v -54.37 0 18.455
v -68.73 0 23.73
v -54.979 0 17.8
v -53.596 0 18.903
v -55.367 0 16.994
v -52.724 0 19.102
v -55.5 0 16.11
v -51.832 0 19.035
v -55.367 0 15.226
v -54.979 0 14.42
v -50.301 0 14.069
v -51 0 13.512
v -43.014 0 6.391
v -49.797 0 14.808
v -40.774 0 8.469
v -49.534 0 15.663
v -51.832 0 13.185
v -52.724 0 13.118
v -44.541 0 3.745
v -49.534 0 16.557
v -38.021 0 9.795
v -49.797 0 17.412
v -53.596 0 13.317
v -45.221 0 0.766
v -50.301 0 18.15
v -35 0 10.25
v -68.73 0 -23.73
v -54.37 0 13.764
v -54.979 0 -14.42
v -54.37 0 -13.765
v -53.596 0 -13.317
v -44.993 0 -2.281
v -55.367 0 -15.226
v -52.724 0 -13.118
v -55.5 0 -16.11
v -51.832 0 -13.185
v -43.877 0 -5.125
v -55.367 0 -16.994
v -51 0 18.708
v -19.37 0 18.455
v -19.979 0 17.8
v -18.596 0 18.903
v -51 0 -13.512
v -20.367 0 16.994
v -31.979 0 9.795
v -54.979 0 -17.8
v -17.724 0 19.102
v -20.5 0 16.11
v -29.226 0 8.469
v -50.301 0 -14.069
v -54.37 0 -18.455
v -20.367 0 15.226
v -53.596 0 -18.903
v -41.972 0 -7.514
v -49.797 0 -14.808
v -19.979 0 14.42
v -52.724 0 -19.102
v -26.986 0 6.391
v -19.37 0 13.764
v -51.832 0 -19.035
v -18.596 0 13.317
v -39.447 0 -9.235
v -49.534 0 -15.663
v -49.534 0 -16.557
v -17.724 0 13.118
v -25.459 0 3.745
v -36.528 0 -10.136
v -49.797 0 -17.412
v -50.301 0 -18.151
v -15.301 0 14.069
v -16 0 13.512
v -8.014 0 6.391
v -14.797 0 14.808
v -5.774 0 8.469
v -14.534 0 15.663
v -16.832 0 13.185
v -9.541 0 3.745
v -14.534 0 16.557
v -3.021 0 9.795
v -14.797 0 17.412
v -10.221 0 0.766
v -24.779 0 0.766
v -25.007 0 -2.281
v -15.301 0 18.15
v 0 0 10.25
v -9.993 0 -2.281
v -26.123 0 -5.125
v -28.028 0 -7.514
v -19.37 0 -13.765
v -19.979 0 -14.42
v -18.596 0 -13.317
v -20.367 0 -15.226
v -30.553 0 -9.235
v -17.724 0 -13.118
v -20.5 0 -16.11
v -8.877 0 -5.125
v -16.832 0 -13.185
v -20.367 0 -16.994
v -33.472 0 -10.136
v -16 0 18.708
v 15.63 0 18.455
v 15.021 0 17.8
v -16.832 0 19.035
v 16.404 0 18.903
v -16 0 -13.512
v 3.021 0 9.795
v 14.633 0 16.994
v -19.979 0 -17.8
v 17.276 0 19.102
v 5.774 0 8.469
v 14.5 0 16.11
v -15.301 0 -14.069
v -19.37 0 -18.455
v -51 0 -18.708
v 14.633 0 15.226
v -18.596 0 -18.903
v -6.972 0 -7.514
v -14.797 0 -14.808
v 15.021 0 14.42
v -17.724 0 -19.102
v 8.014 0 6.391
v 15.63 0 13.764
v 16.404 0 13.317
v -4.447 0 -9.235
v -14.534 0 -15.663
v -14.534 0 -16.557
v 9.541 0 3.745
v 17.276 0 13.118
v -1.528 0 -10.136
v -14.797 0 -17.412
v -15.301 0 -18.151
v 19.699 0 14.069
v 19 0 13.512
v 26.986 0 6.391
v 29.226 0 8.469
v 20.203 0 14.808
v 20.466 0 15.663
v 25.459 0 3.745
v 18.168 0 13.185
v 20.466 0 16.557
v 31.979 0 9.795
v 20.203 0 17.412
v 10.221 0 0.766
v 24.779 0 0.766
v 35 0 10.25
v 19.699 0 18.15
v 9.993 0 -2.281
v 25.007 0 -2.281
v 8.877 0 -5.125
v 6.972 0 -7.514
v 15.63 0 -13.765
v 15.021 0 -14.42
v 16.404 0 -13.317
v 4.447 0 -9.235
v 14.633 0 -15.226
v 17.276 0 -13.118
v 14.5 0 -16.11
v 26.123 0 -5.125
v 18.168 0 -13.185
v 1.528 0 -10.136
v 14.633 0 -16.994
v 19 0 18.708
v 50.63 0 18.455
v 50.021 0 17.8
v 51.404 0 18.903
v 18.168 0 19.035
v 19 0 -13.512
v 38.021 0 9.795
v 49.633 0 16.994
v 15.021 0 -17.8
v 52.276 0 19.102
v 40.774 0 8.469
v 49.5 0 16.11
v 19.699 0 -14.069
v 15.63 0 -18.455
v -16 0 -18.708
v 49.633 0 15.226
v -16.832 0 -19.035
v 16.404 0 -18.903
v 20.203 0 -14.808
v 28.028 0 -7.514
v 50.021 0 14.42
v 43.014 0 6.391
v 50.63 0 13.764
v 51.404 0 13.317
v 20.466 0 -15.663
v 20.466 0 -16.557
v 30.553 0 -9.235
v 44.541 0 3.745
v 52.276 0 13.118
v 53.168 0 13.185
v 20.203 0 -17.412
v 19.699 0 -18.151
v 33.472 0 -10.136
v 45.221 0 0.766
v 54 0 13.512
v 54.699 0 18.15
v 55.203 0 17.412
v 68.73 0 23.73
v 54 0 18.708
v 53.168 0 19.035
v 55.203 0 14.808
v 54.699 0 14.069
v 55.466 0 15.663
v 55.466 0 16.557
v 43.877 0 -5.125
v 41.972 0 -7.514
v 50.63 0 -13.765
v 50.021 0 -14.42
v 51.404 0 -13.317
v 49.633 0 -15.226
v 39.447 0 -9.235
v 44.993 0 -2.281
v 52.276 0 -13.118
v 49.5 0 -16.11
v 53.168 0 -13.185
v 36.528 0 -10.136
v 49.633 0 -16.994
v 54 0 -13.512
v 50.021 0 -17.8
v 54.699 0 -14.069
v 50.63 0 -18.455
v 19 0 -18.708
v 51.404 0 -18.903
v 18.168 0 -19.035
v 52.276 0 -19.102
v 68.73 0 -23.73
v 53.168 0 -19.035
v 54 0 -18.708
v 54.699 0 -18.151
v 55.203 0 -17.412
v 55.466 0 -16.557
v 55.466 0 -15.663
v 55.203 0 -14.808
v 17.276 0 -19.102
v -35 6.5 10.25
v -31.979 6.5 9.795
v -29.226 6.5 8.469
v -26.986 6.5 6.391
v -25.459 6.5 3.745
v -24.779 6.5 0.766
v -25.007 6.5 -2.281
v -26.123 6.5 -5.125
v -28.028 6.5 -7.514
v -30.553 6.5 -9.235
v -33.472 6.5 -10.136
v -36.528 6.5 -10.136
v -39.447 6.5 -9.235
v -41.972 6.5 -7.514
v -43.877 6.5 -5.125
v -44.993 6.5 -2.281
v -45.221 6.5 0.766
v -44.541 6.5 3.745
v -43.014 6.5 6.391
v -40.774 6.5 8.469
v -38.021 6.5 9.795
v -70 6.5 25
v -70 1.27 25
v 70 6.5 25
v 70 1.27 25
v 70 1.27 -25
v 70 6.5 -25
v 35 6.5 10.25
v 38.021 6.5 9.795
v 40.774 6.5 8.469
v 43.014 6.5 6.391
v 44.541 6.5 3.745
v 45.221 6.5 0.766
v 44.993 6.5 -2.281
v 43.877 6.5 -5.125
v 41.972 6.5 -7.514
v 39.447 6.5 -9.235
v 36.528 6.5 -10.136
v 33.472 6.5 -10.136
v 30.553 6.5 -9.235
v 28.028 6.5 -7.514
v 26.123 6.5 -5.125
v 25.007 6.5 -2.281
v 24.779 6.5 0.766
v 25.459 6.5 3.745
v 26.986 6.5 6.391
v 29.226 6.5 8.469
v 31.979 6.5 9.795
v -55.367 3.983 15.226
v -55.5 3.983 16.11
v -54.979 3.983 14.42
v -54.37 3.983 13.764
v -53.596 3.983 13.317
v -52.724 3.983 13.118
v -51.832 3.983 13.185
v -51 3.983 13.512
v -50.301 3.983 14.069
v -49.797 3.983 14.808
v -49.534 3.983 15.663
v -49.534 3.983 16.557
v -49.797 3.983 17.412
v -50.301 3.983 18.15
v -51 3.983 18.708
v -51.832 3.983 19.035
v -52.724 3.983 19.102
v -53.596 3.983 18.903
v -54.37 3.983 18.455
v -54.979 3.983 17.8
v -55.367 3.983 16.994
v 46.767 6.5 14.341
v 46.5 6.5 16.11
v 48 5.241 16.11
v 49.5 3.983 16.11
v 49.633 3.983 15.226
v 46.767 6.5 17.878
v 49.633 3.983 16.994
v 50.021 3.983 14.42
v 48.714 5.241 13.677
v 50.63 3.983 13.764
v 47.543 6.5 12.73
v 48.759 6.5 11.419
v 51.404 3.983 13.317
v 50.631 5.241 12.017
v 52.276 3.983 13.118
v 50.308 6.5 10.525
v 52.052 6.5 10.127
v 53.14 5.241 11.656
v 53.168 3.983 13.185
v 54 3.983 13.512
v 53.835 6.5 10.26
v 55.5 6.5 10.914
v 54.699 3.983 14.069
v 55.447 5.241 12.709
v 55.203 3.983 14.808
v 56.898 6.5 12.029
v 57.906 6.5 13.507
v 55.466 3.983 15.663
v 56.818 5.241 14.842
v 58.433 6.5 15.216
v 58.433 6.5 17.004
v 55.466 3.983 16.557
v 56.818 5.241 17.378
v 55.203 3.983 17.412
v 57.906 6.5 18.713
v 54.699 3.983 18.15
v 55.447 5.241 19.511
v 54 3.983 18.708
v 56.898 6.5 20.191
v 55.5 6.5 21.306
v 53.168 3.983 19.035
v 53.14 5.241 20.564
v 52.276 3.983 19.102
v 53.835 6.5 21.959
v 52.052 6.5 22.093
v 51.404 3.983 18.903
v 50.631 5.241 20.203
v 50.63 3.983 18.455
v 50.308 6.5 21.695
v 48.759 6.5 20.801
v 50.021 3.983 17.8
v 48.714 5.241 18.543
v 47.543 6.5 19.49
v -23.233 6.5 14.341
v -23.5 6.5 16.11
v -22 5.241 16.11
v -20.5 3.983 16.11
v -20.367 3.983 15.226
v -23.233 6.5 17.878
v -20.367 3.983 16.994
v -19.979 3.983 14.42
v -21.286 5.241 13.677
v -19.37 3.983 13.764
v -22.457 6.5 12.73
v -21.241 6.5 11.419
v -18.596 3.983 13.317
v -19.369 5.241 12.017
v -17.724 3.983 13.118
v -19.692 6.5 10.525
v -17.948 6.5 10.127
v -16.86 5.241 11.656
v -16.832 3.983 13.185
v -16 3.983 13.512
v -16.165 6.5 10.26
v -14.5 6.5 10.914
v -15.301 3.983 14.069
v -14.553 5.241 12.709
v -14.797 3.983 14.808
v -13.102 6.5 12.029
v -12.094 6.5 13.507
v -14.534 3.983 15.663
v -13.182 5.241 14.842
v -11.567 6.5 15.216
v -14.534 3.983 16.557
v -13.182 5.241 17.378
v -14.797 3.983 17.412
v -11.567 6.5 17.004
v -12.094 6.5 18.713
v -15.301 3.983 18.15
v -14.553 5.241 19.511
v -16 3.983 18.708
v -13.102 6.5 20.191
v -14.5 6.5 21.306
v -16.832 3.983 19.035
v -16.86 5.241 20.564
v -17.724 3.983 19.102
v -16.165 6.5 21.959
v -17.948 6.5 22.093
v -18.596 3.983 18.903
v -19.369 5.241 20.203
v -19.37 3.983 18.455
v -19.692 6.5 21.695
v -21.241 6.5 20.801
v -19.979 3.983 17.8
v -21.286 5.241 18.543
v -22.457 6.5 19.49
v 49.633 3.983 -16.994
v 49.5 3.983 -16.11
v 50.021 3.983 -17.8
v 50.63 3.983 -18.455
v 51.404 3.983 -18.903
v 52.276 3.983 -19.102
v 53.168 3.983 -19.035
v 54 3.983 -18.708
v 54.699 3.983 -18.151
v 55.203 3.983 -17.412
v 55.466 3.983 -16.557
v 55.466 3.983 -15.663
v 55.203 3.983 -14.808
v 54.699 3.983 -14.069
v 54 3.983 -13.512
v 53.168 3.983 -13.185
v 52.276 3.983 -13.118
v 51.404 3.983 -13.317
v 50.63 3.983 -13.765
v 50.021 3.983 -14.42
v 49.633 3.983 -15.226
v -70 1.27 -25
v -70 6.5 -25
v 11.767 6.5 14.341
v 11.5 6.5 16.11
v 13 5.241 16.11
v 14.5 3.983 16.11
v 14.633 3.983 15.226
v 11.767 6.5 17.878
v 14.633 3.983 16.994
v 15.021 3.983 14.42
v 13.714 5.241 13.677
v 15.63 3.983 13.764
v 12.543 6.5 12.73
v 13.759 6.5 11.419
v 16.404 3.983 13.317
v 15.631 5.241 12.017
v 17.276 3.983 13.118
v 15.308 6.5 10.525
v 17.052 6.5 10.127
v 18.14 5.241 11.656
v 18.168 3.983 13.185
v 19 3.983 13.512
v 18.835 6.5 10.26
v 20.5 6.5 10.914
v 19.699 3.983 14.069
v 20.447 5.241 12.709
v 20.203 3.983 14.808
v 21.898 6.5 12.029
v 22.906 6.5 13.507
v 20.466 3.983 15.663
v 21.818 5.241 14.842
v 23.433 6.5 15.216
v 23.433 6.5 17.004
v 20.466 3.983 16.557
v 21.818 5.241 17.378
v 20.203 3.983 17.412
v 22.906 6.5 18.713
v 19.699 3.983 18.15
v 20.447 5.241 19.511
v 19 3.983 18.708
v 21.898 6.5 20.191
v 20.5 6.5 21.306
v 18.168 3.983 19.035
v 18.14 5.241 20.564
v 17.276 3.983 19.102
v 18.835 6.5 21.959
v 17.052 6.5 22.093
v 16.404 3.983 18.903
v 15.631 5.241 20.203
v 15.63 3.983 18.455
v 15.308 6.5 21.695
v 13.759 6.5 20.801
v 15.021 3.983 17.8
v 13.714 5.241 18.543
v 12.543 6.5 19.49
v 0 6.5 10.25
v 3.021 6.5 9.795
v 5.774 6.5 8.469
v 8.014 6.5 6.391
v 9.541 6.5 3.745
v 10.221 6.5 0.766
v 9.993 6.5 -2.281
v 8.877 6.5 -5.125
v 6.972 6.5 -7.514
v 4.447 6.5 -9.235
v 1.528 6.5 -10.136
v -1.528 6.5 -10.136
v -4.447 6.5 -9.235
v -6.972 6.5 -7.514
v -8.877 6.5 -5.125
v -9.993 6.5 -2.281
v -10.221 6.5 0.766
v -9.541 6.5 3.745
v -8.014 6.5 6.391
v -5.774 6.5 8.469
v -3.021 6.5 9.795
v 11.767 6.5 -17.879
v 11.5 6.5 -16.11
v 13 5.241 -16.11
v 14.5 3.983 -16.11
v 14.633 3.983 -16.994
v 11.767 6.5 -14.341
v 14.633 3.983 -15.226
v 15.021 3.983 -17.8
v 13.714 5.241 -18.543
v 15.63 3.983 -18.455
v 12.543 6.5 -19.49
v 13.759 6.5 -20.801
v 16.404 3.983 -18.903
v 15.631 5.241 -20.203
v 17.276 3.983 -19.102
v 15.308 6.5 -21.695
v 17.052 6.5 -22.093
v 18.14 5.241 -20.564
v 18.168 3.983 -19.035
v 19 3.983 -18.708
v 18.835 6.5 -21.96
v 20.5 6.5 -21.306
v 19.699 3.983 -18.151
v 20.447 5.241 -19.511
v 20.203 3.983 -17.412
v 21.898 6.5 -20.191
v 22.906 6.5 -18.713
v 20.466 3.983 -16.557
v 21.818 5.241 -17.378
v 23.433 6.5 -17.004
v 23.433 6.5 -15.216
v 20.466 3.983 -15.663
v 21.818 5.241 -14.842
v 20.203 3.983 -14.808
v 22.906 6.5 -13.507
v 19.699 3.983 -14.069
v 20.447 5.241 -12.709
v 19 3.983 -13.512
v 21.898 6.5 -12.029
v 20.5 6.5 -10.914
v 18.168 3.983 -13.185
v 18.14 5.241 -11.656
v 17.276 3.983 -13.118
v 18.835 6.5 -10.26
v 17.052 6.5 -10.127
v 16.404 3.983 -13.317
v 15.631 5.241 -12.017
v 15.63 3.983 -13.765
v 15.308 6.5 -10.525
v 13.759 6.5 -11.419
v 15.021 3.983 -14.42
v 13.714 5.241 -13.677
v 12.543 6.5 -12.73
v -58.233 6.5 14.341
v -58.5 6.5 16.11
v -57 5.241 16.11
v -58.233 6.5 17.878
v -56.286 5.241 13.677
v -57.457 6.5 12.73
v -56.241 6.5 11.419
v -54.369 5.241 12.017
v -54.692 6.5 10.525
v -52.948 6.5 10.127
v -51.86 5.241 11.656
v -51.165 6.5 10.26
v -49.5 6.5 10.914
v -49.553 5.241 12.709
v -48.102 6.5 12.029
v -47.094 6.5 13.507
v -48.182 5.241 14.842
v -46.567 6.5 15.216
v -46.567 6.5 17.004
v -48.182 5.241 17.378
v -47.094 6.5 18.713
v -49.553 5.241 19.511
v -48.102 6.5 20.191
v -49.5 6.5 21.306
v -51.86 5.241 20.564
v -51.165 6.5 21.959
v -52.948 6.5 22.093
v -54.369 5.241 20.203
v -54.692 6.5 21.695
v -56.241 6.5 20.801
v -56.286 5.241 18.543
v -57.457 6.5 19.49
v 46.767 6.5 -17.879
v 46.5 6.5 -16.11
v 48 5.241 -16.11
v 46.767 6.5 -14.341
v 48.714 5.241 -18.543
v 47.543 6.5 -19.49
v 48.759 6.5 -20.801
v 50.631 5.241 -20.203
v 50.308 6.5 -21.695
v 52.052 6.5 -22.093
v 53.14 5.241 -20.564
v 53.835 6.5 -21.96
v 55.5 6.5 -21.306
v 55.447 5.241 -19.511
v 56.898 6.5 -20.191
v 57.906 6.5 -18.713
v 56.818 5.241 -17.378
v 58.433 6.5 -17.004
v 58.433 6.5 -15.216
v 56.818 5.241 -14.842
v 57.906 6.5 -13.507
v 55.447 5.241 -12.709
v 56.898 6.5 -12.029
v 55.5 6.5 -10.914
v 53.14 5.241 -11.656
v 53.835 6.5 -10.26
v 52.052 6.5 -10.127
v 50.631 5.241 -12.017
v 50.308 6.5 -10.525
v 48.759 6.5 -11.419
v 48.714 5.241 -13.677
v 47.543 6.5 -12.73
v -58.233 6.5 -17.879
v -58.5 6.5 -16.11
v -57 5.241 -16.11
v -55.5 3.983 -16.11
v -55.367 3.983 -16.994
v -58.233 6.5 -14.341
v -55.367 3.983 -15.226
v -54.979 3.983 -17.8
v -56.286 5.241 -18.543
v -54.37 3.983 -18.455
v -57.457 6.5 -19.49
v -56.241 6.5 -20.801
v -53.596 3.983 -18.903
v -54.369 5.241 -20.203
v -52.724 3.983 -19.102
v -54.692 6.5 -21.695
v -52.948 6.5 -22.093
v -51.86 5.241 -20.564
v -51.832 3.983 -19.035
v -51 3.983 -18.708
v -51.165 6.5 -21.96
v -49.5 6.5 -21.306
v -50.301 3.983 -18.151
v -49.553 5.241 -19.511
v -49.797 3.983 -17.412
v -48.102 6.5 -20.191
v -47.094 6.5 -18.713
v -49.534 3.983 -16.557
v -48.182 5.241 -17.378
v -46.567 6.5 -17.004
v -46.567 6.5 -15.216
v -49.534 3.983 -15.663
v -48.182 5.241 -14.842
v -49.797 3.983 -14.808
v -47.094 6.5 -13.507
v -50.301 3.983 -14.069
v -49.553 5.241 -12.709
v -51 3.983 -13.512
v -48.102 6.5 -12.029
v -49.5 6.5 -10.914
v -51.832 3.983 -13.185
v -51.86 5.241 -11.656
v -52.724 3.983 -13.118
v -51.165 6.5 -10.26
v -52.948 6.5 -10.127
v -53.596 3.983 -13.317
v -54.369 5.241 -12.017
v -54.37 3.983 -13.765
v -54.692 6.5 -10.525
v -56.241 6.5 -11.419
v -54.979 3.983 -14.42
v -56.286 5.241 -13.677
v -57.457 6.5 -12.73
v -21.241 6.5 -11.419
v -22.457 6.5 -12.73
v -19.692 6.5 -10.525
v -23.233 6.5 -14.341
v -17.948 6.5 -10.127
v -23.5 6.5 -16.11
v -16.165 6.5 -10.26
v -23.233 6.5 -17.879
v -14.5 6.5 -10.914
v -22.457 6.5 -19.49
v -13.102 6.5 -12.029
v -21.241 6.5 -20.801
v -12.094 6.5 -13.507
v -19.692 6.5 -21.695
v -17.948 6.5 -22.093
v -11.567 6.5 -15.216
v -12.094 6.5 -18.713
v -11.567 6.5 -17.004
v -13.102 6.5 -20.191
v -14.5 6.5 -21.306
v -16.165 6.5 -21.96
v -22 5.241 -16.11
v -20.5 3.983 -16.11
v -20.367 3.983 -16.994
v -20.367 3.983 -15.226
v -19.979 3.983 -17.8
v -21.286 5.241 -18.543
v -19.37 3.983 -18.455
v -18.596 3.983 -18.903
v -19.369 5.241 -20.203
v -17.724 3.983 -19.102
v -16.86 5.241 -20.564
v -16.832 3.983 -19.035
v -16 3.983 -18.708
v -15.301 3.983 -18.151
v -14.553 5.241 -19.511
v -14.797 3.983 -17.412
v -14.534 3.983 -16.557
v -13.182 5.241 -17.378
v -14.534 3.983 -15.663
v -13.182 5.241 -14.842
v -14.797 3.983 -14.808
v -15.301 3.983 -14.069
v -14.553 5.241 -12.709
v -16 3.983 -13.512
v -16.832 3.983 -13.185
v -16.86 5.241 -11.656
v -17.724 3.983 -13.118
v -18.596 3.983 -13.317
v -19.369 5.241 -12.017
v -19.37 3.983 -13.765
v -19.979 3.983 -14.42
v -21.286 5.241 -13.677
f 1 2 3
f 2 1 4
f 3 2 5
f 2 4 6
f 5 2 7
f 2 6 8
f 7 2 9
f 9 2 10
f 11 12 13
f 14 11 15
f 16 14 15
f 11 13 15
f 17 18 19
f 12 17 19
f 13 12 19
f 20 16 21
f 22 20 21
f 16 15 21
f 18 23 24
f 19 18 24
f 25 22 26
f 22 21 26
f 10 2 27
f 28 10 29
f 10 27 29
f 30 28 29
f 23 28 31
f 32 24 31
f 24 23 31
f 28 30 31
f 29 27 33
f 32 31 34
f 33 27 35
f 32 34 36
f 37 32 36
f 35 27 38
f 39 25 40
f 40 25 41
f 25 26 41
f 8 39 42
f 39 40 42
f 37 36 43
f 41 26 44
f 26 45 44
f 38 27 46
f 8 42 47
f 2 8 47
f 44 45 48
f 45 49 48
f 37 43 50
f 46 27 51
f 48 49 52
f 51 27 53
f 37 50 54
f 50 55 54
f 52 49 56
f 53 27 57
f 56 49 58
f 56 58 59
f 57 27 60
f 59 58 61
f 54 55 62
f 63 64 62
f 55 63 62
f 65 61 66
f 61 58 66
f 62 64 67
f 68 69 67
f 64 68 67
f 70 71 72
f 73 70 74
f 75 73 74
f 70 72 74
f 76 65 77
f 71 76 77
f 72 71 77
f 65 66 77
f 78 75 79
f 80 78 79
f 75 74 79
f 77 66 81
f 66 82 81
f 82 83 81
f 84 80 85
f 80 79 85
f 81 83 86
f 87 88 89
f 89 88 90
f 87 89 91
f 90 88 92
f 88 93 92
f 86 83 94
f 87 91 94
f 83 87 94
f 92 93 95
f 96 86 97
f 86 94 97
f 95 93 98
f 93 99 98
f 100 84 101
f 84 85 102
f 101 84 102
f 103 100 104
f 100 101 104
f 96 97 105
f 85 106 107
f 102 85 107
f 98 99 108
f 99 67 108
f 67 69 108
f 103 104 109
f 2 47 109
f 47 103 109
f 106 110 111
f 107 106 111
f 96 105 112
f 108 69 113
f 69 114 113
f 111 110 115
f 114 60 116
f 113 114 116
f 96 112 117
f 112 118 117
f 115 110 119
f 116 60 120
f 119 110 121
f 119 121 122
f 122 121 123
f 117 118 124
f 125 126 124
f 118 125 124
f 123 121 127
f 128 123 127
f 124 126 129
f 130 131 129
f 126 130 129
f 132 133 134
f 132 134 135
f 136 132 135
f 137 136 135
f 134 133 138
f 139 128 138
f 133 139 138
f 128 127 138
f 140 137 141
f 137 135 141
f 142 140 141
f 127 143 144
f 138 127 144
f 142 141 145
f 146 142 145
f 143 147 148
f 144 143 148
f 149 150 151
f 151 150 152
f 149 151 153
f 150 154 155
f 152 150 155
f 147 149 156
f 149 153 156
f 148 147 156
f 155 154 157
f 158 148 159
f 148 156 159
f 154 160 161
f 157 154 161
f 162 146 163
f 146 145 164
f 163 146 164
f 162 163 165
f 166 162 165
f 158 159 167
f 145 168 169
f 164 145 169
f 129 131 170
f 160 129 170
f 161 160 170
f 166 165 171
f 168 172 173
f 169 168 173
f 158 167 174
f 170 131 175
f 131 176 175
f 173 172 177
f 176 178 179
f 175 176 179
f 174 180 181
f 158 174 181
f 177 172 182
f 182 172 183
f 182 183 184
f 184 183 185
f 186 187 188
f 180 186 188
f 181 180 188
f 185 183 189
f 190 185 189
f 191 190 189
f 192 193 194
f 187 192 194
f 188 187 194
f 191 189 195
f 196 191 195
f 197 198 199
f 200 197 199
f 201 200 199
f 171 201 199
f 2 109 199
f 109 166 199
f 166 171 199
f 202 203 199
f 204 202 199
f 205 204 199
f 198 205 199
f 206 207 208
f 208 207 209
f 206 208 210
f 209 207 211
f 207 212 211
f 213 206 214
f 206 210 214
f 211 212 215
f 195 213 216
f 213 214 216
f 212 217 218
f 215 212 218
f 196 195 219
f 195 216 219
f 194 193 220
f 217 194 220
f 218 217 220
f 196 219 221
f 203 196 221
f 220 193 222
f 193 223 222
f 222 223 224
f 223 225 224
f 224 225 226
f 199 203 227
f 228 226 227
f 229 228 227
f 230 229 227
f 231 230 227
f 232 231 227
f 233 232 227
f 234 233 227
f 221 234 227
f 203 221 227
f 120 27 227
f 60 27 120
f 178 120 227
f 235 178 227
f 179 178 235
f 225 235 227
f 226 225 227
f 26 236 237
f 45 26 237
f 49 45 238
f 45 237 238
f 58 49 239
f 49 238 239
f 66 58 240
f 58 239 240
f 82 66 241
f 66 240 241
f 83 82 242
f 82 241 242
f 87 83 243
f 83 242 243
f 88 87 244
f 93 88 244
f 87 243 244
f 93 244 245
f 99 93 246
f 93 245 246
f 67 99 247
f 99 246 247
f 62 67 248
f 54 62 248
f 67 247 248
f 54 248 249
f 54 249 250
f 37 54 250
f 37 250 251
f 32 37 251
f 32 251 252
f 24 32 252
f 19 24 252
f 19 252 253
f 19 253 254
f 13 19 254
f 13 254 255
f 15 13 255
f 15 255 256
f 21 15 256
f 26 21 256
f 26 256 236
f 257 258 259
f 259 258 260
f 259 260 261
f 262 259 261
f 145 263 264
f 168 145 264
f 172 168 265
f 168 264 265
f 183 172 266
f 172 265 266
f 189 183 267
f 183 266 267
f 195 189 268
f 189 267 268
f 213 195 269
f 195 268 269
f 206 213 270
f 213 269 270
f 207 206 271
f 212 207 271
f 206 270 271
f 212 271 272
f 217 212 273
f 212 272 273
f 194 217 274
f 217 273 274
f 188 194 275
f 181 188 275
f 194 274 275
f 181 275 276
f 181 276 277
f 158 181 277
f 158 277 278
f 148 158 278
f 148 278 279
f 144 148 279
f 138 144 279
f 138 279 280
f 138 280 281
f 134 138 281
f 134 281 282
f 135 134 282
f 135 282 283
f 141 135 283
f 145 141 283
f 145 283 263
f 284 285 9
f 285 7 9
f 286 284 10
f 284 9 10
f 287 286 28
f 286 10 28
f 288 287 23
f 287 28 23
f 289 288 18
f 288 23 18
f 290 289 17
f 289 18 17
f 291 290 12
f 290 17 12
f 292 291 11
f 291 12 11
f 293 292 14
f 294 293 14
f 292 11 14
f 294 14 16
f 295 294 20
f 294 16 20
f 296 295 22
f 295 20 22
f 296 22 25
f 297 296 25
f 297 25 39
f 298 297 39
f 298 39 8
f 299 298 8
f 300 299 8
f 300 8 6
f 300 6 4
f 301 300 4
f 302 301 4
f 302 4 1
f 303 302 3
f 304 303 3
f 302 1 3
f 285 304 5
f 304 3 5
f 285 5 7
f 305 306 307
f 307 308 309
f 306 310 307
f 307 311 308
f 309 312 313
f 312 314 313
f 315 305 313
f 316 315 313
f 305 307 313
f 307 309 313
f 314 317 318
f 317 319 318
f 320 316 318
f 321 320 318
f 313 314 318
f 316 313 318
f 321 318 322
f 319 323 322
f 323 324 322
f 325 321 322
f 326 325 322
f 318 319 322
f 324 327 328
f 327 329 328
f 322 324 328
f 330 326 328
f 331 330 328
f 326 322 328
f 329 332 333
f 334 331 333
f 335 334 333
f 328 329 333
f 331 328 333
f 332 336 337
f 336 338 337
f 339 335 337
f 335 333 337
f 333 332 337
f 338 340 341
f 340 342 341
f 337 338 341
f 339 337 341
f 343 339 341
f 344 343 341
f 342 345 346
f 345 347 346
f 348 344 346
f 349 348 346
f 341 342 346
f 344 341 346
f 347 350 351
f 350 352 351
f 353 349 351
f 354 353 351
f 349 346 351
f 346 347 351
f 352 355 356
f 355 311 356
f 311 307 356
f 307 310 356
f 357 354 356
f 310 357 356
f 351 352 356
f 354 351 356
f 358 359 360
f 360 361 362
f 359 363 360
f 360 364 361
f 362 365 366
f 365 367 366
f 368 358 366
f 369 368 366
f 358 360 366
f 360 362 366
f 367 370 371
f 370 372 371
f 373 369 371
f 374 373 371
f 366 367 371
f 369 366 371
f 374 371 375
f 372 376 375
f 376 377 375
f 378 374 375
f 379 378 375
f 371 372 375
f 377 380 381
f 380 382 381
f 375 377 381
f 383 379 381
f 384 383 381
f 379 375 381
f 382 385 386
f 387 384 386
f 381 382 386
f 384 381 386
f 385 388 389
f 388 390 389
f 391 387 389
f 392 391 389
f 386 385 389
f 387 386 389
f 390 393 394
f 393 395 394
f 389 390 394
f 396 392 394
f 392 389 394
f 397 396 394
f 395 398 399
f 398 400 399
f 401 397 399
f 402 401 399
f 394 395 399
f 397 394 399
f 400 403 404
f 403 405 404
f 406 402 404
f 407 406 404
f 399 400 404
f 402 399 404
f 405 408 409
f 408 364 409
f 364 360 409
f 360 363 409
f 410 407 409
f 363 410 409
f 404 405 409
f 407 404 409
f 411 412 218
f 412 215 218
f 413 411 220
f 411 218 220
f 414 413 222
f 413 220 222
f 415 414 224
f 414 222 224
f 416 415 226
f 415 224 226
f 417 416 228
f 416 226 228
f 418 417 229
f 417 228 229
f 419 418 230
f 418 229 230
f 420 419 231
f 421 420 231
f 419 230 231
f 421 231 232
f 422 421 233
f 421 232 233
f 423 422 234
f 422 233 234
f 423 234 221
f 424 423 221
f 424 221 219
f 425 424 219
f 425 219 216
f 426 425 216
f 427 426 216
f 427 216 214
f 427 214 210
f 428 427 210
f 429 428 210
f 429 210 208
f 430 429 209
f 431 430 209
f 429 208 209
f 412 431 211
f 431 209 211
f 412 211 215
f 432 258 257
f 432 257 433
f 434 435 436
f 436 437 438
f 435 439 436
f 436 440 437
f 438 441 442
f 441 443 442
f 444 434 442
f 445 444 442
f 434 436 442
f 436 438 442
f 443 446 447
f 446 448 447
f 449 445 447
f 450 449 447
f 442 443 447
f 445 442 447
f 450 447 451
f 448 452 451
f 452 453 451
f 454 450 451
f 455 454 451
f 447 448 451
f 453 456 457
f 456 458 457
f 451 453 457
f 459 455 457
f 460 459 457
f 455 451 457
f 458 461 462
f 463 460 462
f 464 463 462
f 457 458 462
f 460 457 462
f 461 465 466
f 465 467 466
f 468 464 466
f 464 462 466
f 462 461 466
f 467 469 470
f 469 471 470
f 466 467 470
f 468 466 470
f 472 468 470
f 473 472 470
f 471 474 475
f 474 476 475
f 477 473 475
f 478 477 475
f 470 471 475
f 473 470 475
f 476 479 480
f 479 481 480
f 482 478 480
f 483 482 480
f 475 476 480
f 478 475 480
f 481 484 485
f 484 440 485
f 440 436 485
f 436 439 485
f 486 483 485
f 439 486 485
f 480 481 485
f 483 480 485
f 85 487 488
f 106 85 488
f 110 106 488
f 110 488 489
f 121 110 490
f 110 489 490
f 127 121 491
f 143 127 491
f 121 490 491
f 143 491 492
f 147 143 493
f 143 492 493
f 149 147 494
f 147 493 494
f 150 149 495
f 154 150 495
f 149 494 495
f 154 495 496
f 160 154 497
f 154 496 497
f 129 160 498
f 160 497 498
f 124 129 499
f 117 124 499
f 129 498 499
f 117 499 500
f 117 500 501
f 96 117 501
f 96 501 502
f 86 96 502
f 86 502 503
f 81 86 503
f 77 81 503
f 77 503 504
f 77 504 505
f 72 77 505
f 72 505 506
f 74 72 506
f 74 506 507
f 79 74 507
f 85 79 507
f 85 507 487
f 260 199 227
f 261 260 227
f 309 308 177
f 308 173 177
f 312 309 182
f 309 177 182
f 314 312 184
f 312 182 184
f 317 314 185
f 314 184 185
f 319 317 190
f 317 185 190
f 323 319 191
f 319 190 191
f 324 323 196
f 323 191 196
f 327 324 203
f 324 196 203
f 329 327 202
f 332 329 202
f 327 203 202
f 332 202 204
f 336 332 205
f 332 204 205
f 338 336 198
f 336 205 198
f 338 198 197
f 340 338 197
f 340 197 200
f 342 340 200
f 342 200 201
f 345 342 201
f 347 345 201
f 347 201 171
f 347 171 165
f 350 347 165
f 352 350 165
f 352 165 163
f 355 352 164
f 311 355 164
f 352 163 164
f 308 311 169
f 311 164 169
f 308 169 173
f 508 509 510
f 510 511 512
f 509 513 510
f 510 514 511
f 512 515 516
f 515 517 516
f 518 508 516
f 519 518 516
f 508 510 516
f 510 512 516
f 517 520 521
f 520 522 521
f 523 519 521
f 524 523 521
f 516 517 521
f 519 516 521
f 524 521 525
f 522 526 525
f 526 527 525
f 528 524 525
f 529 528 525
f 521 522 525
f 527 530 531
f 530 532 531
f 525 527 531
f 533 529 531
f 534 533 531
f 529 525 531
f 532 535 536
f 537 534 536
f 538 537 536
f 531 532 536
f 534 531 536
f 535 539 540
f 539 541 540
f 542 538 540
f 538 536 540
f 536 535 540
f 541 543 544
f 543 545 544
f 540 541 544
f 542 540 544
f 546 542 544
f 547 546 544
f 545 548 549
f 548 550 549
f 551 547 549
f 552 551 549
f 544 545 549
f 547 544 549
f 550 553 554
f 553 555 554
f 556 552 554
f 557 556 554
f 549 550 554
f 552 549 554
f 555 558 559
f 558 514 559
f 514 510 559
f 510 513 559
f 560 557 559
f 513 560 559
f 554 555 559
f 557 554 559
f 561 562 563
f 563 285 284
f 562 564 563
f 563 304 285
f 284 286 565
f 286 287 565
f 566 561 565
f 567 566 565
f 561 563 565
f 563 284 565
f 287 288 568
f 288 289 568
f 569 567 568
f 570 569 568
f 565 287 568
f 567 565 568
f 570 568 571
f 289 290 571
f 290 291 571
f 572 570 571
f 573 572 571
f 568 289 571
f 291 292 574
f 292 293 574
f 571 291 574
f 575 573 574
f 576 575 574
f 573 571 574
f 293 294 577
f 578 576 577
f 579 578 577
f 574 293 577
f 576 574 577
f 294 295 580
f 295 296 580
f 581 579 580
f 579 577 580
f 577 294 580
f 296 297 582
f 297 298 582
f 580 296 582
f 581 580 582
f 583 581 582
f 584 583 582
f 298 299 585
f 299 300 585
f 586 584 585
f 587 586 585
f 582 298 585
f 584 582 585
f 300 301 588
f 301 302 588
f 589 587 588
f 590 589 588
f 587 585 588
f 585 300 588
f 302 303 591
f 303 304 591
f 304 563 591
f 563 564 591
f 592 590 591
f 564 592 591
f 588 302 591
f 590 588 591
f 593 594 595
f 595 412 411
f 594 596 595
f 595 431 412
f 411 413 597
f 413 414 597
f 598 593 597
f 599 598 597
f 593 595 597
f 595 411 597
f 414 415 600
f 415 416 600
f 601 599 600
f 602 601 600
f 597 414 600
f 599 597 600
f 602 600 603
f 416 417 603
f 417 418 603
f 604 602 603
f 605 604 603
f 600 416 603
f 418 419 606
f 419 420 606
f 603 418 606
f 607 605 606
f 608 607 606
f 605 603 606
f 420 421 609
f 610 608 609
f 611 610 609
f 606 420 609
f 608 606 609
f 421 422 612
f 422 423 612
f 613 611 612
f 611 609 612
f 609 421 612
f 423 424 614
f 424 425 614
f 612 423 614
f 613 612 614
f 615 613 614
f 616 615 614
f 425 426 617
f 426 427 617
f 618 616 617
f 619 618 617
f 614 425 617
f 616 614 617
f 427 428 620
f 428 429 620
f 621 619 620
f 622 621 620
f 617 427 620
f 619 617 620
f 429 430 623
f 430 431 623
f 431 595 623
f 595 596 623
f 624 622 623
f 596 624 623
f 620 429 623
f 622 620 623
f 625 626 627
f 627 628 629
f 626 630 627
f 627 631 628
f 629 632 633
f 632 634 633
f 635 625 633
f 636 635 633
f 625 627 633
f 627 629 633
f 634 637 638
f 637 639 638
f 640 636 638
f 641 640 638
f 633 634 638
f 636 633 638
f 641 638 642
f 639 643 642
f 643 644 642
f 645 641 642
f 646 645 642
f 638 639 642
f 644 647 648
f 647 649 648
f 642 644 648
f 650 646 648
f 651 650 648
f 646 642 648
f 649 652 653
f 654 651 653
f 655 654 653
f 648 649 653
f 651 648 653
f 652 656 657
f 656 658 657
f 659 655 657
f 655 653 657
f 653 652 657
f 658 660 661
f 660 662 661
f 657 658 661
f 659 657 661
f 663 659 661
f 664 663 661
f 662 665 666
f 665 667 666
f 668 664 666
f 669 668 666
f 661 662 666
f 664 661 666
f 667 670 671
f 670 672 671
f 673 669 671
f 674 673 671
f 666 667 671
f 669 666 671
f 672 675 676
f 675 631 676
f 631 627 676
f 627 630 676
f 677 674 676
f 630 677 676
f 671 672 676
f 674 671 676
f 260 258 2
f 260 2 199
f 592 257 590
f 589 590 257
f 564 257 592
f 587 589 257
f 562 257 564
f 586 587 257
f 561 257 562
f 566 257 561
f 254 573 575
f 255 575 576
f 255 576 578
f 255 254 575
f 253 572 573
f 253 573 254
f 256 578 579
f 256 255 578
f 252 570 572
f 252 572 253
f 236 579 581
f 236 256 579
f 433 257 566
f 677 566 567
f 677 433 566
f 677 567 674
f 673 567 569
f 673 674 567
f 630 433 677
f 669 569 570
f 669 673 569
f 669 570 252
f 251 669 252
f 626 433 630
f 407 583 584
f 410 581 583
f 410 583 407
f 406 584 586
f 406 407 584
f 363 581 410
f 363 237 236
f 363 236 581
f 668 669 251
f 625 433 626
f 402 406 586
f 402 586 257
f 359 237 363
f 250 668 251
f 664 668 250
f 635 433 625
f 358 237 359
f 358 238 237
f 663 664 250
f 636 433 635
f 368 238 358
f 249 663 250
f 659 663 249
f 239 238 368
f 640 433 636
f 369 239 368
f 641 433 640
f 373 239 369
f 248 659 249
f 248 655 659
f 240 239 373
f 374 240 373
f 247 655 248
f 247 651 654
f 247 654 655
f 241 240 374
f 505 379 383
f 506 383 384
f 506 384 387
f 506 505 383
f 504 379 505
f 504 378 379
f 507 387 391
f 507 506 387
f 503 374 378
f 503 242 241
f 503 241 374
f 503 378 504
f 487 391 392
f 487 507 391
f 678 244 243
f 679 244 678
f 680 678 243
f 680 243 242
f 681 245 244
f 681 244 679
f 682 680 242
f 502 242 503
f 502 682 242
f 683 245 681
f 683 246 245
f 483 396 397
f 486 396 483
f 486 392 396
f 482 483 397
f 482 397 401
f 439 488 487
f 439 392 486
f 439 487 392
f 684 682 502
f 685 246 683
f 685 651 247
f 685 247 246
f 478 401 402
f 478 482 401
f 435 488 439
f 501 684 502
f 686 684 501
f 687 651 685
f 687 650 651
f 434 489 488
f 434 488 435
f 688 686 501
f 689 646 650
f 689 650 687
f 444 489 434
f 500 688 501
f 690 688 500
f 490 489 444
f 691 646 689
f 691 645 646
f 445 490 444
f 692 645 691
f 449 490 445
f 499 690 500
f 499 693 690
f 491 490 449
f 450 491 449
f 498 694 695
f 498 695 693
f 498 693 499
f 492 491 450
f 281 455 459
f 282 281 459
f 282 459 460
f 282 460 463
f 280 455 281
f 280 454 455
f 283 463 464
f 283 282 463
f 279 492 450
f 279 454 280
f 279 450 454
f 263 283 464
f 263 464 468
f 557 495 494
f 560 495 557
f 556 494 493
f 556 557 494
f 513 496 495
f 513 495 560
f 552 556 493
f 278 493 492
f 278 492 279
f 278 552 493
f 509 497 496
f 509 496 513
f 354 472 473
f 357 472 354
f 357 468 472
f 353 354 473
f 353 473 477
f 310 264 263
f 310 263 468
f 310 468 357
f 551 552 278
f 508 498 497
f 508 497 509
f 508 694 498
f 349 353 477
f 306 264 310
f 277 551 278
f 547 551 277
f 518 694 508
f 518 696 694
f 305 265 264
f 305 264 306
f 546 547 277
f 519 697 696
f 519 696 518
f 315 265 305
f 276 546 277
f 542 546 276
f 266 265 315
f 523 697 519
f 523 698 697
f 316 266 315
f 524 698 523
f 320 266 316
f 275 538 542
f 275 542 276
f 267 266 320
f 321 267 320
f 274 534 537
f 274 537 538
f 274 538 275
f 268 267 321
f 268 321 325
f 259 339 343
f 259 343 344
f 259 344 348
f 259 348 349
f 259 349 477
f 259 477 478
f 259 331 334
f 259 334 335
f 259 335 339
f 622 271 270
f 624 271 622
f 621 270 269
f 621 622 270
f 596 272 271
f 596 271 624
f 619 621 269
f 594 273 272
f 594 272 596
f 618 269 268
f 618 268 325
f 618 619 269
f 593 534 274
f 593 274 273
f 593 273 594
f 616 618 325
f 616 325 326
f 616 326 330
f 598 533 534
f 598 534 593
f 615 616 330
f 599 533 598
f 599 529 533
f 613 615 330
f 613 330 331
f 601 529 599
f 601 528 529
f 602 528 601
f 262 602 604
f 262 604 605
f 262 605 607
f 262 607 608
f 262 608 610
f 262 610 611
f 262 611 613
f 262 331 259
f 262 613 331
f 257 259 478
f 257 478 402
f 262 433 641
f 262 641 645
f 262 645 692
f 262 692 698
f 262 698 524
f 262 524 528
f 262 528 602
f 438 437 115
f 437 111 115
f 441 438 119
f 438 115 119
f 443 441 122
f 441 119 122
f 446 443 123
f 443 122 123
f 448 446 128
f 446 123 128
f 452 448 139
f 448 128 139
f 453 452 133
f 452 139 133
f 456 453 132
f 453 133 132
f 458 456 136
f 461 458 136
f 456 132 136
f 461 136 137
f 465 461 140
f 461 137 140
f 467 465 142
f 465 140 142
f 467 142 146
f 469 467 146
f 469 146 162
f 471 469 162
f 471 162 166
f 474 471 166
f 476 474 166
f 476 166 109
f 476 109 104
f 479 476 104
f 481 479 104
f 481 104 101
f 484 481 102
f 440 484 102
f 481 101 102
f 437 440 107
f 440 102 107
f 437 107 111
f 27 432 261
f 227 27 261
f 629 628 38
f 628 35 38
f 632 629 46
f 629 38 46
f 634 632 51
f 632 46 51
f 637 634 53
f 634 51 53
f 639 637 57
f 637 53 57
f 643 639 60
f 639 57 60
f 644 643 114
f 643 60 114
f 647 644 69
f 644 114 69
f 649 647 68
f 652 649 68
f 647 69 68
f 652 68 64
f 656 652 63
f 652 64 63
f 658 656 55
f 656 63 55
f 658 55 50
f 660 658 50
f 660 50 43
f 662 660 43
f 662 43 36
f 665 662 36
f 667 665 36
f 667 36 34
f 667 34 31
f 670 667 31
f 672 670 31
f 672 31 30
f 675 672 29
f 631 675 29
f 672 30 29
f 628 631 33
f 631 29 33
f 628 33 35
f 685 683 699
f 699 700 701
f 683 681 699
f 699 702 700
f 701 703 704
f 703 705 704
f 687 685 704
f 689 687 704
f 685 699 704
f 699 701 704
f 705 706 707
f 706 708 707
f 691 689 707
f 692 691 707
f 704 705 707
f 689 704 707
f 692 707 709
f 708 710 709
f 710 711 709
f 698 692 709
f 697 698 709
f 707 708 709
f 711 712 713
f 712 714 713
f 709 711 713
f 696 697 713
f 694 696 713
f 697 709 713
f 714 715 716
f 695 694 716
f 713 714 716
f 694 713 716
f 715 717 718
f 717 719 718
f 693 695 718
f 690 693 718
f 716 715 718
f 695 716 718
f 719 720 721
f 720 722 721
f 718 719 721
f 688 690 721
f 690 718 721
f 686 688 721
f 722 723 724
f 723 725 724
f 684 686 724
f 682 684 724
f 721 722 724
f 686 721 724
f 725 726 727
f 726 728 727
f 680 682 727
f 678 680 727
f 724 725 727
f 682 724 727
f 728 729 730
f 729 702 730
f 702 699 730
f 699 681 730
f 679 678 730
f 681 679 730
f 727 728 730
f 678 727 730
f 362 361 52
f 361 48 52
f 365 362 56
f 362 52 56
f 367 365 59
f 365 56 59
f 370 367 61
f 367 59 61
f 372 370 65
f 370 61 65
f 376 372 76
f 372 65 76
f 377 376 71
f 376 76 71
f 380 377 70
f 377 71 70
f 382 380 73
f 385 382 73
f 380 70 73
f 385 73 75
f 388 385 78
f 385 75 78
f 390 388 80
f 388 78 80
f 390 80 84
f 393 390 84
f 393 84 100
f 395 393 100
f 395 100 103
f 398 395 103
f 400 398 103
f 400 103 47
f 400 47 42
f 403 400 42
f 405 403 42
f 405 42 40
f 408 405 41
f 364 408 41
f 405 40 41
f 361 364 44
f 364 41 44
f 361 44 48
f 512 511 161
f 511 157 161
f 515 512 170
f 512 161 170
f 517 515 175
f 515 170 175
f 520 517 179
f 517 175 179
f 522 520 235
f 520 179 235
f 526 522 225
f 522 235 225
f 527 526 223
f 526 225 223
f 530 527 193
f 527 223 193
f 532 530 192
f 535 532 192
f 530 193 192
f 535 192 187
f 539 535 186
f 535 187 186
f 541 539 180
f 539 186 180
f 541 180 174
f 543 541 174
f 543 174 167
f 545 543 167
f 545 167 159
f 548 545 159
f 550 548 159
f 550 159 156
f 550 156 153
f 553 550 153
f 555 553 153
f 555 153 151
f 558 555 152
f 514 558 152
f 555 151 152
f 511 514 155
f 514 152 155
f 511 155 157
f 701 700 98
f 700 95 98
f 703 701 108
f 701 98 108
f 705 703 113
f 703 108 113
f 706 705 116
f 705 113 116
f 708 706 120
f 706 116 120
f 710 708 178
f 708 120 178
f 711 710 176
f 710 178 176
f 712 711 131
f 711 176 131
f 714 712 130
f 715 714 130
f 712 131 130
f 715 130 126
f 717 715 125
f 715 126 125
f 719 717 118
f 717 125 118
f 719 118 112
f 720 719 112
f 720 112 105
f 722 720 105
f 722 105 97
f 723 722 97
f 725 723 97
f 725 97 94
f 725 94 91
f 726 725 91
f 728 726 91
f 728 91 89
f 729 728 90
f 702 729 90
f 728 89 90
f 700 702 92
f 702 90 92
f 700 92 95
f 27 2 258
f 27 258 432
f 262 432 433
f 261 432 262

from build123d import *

# Parameters (mm, degrees)
SKETCH1_W                                         = 140
SKETCH1_H                                         = 50
BOSS_EXTRUDE2_DEPTH                               = 6.5
SKETCH2_R                                         = 10.25
CUT_EXTRUDE1_DEPTH                                = 12.7
LPATTERN1_COUNT                                   = 2
LPATTERN1_PITCH                                   = 35
LPATTERN1_COL_COUNT                               = 2
LPATTERN1_COL_PITCH                               = 35
CSK_FOR_6_FLAT_HEAD_MACHINE_SCREW_100_D           = 6
CSK_FOR_6_FLAT_HEAD_MACHINE_SCREW_100_CSINK_D     = 12
CSK_FOR_6_FLAT_HEAD_MACHINE_SCREW_100_CSINK_ANGLE = 100
LPATTERN2_COUNT                                   = 4
LPATTERN2_PITCH                                   = 35
LPATTERN2_COUNT_DIR2                              = 2
LPATTERN2_PITCH_DIR2                              = 32.2199
CHAMFER1_SIZE                                     = 1.27


with BuildPart() as part:
    # Sketch1 → Boss-Extrude2 (new body)
    with BuildSketch(Plane(origin=(0, 0, 0), x_dir=(1, 0, 0), z_dir=(0, 1, 0))):
        Rectangle(SKETCH1_W, SKETCH1_H)
    extrude(amount=BOSS_EXTRUDE2_DEPTH)

    # Sketch2 → Cut-Extrude1 (cut)
    with BuildSketch(Plane(origin=(0, 6.5, 0), x_dir=(1, 0, 0), z_dir=(0, 1, 0))):
        with Locations(Location((0, 0, 0), (0, 0, 270))):
            Circle(SKETCH2_R)
    cut_extrude1 = extrude(amount=-CUT_EXTRUDE1_DEPTH, mode=Mode.SUBTRACT)

    # LPattern1: Cut-Extrude1 ×2
    with Locations(*[(i * LPATTERN1_PITCH, 0, 0) for i in range(1, LPATTERN1_COUNT)]):
        add(cut_extrude1, mode=Mode.SUBTRACT)

    # LPattern1 col: Cut-Extrude1 ×2
    with Locations(*[(-i * LPATTERN1_COL_PITCH, 0, 0) for i in range(1, LPATTERN1_COL_COUNT)]):
        add(cut_extrude1, mode=Mode.SUBTRACT)

    # CSK for #6 Flat Head Machine Screw (100)1 (through all)
    with Locations(Plane(origin=(0, 6.5, 0), x_dir=(1, 0, 0), z_dir=(0, 1, 0))):
        with Locations((-52.5, 16.11)):
            csk_for_6_flat_head_machine_screw_100 = CounterSinkHole(CSK_FOR_6_FLAT_HEAD_MACHINE_SCREW_100_D / 2, CSK_FOR_6_FLAT_HEAD_MACHINE_SCREW_100_CSINK_D / 2, counter_sink_angle=CSK_FOR_6_FLAT_HEAD_MACHINE_SCREW_100_CSINK_ANGLE)

    # LPattern2: CSK for _6 Flat Head Machine Screw _100 4 × 2
    with Locations(*[(i * LPATTERN2_PITCH, 0, j * LPATTERN2_PITCH_DIR2) for i in range(LPATTERN2_COUNT) for j in range(LPATTERN2_COUNT_DIR2) if (i, j) != (0, 0)]):
        add(csk_for_6_flat_head_machine_screw_100, mode=Mode.SUBTRACT)

    # Chamfer1
    chamfer1_edges = [part.edges().sort_by_distance(p)[0] for p in [
        (0, 0, 25),
        (-70, 0, 0),
        (0, 0, -25),
        (70, 0, 0),
    ]]
    chamfer(chamfer1_edges, length=CHAMFER1_SIZE)


solid = part.part
